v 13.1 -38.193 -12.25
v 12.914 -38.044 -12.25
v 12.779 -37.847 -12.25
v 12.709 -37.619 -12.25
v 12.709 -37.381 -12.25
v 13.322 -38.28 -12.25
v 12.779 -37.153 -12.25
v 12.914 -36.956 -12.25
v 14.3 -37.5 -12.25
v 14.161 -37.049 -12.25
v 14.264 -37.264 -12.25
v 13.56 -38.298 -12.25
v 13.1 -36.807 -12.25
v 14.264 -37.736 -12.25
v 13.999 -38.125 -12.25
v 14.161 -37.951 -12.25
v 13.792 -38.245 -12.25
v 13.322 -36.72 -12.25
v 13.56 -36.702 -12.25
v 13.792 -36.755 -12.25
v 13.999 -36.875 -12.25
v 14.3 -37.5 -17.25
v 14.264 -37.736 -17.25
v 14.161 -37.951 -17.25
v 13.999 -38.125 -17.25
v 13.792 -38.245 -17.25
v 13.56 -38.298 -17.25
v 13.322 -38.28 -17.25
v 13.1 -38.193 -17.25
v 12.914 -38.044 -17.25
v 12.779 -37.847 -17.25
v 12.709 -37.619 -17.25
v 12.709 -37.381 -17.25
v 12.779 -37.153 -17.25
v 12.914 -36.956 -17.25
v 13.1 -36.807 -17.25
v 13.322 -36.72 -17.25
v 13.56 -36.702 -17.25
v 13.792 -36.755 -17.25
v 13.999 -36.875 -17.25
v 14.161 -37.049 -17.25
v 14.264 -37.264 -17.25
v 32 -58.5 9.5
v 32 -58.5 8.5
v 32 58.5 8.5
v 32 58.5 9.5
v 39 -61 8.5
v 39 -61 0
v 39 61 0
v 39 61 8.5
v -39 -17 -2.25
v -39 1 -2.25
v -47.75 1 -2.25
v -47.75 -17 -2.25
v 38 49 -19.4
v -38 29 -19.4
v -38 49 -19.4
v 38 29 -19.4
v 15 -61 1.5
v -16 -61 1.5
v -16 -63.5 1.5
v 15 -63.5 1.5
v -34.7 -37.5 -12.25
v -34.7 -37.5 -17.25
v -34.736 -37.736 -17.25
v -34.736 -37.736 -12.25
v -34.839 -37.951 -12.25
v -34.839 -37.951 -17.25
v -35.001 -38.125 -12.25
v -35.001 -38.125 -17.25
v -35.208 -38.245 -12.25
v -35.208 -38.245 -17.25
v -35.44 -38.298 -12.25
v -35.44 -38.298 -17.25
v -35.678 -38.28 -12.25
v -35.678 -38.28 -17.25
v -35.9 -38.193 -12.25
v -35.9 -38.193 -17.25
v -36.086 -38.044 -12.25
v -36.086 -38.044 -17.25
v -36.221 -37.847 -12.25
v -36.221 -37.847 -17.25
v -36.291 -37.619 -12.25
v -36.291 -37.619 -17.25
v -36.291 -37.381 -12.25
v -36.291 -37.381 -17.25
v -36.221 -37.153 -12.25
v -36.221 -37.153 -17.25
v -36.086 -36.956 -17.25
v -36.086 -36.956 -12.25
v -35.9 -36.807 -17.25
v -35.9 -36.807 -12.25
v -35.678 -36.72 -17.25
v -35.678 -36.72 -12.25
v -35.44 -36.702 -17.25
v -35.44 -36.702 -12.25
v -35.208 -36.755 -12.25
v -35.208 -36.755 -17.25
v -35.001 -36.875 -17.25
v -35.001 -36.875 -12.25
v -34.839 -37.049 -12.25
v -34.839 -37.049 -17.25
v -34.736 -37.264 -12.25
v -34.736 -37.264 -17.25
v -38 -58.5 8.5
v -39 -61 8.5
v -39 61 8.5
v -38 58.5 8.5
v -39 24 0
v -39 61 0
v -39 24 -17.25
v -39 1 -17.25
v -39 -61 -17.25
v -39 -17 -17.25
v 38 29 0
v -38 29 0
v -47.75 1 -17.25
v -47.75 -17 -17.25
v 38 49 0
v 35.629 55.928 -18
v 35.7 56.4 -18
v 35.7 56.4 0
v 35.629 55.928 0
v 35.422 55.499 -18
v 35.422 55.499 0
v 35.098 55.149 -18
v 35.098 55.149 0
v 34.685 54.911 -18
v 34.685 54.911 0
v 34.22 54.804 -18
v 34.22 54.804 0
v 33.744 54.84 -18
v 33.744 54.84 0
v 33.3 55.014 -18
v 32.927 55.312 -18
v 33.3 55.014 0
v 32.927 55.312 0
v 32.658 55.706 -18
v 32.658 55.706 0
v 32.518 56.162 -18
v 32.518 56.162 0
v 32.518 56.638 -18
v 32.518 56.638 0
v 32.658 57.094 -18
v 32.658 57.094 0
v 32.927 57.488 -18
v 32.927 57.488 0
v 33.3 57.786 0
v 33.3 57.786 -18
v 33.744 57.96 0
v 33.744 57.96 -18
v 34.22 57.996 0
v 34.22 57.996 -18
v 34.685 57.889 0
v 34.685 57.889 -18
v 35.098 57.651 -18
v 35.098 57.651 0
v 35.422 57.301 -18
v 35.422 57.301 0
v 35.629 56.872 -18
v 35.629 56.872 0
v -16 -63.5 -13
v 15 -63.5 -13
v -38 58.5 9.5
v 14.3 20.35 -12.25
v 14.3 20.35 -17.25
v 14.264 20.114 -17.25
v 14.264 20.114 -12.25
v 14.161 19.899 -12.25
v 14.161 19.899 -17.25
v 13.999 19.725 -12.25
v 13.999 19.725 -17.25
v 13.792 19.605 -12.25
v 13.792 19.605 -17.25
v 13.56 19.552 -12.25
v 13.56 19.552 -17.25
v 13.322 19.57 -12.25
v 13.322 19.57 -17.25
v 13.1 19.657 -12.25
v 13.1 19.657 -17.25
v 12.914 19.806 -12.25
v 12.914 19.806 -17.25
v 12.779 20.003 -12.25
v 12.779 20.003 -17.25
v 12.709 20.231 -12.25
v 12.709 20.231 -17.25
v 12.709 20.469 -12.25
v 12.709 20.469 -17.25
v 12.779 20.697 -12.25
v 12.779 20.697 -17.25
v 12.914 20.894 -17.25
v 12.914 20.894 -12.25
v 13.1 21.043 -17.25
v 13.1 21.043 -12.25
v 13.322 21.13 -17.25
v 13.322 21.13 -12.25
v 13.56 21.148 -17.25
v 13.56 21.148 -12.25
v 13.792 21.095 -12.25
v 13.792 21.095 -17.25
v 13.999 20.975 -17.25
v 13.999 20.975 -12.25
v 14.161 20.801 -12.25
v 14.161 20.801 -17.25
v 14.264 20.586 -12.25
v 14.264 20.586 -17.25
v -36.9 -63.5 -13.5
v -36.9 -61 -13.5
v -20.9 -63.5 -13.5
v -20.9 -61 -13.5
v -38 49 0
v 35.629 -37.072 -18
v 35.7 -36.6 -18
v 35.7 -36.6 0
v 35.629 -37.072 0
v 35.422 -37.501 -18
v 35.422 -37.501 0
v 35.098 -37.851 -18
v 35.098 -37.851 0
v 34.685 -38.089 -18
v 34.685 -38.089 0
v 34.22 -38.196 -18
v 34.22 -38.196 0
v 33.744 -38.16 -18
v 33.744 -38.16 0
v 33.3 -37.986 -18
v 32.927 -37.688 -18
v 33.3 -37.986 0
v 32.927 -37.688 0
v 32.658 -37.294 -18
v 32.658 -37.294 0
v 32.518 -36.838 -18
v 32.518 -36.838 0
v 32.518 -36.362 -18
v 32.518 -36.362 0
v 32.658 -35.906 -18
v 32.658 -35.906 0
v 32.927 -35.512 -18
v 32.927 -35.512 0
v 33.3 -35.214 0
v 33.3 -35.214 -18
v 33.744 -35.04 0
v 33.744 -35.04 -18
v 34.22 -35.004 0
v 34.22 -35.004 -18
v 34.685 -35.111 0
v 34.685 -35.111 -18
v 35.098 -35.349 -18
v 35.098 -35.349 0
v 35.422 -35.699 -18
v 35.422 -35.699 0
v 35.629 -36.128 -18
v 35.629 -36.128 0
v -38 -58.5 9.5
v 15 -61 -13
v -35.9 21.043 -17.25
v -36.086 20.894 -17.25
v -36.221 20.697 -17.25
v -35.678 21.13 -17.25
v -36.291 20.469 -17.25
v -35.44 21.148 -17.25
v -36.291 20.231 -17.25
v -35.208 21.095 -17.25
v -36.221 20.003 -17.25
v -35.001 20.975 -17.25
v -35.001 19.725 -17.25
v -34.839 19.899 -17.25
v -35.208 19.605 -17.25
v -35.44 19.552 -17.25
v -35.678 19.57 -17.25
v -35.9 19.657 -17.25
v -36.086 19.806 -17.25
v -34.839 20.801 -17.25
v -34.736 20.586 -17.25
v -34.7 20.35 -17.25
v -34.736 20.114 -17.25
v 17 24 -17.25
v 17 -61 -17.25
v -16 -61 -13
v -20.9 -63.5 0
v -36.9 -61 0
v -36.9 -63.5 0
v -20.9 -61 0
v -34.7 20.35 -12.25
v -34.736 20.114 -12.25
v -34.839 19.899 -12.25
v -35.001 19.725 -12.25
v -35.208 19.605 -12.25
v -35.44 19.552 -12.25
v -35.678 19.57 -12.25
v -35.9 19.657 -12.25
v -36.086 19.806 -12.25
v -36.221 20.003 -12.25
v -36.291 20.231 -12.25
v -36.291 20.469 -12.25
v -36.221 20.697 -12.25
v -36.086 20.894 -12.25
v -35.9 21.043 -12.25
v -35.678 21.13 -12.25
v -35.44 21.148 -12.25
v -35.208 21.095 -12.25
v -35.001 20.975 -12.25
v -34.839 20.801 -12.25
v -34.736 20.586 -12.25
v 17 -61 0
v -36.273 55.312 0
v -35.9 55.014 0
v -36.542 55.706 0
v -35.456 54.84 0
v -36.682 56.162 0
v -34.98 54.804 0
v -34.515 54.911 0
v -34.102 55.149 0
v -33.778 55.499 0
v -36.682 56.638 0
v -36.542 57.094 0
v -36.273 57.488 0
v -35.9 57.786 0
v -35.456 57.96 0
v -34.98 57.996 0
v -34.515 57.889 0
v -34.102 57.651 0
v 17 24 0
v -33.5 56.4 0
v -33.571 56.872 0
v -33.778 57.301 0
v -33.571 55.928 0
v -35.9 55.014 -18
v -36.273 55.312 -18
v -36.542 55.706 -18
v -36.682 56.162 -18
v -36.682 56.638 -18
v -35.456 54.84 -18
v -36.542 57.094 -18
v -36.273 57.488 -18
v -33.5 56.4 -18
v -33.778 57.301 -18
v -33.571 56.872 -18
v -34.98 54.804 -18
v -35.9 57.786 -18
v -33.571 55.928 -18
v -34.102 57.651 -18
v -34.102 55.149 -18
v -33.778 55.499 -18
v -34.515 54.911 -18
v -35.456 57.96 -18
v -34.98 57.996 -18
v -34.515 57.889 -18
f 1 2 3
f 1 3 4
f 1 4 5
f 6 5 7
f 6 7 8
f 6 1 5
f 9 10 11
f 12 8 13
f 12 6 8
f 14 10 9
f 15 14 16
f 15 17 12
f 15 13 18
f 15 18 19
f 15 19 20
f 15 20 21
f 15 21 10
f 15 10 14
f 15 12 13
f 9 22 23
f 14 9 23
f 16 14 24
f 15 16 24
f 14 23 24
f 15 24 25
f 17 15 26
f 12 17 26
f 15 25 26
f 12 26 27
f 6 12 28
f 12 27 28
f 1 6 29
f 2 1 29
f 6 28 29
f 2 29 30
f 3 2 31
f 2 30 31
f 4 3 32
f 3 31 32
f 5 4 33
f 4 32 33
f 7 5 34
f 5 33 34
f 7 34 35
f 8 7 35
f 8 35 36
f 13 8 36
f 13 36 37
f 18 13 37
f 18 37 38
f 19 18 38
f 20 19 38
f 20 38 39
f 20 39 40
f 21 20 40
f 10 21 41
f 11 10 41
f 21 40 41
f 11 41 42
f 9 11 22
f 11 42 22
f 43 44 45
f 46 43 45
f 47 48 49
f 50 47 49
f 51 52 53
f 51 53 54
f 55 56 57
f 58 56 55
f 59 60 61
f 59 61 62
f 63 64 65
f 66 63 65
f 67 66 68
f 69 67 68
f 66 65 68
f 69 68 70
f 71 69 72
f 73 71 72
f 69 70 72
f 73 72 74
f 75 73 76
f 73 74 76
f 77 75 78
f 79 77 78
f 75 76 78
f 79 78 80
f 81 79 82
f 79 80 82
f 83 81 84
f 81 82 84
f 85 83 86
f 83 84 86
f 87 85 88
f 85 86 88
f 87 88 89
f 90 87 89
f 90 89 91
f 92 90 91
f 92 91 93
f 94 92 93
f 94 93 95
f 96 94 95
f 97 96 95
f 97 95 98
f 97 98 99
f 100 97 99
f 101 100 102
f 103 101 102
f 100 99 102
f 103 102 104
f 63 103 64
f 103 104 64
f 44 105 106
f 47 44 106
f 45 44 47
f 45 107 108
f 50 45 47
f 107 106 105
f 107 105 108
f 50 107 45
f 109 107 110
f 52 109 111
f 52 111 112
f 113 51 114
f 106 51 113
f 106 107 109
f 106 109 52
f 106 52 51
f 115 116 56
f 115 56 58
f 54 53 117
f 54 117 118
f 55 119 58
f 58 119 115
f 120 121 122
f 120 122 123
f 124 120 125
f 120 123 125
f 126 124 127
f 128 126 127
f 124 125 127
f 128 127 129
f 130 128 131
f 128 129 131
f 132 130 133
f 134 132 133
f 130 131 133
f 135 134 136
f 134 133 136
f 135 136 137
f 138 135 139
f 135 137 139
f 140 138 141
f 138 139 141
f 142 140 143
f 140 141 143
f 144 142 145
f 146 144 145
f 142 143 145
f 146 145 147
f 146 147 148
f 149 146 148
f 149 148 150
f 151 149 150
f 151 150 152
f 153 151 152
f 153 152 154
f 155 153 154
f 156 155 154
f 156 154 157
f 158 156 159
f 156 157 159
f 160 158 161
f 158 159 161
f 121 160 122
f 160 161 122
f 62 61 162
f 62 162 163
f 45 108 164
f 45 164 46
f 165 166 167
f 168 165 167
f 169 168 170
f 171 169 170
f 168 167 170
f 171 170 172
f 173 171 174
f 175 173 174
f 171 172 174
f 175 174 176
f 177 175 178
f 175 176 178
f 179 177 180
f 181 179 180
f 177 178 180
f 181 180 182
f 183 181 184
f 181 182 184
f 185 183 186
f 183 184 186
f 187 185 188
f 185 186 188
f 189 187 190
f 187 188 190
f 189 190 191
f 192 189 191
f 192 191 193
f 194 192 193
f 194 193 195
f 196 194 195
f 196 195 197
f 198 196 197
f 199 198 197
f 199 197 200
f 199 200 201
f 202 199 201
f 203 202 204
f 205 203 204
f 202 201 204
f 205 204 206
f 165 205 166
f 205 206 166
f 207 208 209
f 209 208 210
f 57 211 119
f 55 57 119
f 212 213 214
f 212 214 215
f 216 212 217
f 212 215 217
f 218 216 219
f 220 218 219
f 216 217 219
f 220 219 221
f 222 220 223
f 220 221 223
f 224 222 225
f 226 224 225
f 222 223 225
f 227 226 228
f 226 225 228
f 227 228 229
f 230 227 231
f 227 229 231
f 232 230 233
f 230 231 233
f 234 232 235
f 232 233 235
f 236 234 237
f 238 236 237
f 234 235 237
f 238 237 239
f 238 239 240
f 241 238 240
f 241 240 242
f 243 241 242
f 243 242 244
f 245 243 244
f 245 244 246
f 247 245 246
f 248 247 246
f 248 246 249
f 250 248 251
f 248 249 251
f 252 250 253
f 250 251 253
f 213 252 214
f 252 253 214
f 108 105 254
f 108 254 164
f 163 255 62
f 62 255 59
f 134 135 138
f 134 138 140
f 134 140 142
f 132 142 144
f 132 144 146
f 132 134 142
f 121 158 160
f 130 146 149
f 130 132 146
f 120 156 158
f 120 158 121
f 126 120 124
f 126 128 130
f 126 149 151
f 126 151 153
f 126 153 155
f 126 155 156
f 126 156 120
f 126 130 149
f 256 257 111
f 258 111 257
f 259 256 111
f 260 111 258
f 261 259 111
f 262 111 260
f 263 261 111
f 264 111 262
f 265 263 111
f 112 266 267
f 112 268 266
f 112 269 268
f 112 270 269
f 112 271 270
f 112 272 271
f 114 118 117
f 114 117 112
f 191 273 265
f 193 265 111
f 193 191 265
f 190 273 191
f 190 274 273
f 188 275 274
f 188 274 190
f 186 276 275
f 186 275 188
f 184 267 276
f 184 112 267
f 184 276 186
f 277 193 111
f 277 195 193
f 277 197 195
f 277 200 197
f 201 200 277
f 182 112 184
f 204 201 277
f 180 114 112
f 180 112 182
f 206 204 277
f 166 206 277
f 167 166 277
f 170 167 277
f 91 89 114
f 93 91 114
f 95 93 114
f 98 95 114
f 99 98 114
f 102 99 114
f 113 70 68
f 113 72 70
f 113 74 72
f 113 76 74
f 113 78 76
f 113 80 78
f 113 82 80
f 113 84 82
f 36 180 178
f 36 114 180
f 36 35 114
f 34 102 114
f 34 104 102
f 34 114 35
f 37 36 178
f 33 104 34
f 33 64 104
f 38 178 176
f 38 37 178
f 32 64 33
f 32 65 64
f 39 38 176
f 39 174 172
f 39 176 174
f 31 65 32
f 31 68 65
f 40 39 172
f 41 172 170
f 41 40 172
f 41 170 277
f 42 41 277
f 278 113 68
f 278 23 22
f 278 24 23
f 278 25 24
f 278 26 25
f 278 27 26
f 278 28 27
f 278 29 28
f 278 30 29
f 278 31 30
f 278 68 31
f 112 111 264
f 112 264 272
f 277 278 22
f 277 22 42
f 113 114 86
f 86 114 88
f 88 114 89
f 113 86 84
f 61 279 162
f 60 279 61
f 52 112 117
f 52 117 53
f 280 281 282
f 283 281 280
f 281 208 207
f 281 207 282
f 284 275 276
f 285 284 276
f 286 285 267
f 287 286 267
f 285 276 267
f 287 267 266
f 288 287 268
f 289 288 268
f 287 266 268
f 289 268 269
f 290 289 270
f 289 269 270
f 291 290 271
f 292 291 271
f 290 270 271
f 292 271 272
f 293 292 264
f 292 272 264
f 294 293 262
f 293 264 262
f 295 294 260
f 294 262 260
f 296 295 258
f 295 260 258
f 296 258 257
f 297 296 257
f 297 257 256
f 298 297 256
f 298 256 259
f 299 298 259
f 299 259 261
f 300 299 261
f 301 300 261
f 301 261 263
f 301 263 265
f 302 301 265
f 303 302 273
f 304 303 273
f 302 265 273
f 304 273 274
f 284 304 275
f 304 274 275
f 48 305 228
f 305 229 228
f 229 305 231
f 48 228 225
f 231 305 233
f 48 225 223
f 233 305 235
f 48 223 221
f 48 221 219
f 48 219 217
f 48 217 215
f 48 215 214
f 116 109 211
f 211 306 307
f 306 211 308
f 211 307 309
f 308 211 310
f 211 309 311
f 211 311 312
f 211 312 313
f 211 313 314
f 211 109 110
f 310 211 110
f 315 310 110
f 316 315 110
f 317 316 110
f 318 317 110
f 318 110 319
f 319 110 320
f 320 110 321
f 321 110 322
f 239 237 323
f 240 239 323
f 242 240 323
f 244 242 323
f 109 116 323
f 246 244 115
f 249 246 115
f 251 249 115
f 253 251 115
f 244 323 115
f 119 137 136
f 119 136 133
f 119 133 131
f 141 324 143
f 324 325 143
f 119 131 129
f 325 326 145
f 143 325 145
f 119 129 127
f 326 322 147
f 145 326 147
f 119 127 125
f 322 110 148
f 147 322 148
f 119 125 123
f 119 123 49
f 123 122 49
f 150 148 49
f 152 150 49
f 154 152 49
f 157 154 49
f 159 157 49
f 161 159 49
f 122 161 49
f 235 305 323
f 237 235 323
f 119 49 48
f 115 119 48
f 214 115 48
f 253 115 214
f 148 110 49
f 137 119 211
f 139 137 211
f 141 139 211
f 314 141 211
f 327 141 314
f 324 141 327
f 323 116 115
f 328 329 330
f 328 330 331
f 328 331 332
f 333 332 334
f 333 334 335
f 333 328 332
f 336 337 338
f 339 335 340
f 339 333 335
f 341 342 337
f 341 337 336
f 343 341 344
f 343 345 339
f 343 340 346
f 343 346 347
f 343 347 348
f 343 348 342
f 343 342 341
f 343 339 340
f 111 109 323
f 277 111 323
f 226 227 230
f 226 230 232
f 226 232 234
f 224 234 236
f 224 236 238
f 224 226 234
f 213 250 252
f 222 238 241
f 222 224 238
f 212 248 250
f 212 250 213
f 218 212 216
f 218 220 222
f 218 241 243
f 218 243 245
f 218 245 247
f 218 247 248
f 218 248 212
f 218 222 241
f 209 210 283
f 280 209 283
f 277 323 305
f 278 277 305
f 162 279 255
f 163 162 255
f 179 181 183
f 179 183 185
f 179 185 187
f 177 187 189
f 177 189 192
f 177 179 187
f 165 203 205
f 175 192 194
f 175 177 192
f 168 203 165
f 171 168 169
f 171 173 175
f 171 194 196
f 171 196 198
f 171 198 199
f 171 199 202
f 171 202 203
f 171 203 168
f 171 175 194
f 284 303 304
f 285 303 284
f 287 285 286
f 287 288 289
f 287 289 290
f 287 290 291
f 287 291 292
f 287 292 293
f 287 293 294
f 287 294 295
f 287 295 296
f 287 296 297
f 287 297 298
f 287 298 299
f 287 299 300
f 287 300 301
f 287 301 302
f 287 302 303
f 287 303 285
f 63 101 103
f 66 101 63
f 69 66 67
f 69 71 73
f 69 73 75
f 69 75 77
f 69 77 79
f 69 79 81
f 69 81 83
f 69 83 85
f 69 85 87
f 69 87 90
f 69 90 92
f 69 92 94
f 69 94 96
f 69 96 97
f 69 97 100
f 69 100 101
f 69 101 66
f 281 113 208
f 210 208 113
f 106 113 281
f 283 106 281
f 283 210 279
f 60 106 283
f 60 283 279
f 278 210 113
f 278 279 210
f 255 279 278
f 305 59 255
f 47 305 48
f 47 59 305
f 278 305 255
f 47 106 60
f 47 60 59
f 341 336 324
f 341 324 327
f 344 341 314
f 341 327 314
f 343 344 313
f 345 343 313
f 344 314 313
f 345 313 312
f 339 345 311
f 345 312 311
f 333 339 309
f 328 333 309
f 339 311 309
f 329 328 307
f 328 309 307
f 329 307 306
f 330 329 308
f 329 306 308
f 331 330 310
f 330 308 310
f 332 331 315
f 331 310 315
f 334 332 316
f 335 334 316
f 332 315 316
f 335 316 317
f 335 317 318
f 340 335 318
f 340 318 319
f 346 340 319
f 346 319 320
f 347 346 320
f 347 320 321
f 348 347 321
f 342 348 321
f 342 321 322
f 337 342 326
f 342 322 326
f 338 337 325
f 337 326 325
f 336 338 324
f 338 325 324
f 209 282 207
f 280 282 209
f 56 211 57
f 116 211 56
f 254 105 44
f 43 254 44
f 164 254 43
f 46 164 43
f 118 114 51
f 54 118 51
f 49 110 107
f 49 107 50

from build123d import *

# Parameters (mm, degrees)
F0_W      = 78
F0_H      = 122
F1_DEPTH  = 8.5
F2_W      = 70
F2_H      = 117
F3_DEPTH  = 1
F4_W      = 56
F4_H      = 85
F5_DEPTH  = 17.25
F6_W      = 18
F6_H      = 15
F7_DEPTH  = 8.75
F8_W      = 16
F8_H      = 13.5
F8_W_2    = 31
F8_H_2    = 14.5
F9_DEPTH  = 2.5
F10_R     = 0.8
F11_DEPTH = 5
F12_R     = 1.6
F13_DEPTH = 18
F14_W     = 76
F14_H     = 20
F15_DEPTH = 19.4


with BuildPart() as f1:
    # F0 (on Top) → F1 (new body)
    with BuildSketch(Plane.XY):
        Rectangle(F0_W, F0_H)
    extrude(amount=F1_DEPTH)

    # F2 (on face) → F3 (join)
    with BuildSketch(Plane.XY.offset(8.5)):
        with Locations((-3, 0)):
            Rectangle(F2_W, F2_H)
    extrude(amount=F3_DEPTH)

    # F4 (on face) → F5 (join)
    with BuildSketch(Plane(origin=(0, 0, 0), x_dir=(1, 0, 0), z_dir=(0, 0, -1))):
        with Locations((-11, 18.5)):
            Rectangle(F4_W, F4_H)
    extrude(amount=F5_DEPTH)

    # F6 (on face) → F7 (join)
    with BuildSketch(Plane(origin=(-39, 0, 0), x_dir=(0, -1, 0), z_dir=(-1, 0, 0))):
        with Locations((8, -9.75)):
            Rectangle(F6_W, F6_H)
    extrude(amount=F7_DEPTH)

    # F8 (on face) → F9 (join)
    with BuildSketch(Plane.XZ.offset(61)):
        with Locations((-28.9, -6.75)):
            Rectangle(F8_W, F8_H)
        with Locations((-0.5, -5.75)):
            Rectangle(F8_W_2, F8_H_2)
    extrude(amount=F9_DEPTH)

    # F10 (on face) → F11 (cut)
    with BuildSketch(Plane(origin=(0, 0, -17.25), x_dir=(1, 0, 0), z_dir=(0, 0, -1))):
        with Locations((13.5, 37.5)):
            Circle(F10_R)
        with Locations((-35.5, 37.5)):
            Circle(F10_R)
        with Locations((-35.5, -20.35)):
            Circle(F10_R)
        with Locations((13.5, -20.35)):
            Circle(F10_R)
    extrude(amount=-F11_DEPTH, mode=Mode.SUBTRACT)

    # F12 (on face) → F13 (join)
    with BuildSketch(Plane(origin=(0, 0, 0), x_dir=(1, 0, 0), z_dir=(0, 0, -1))):
        with Locations((-35.1, -56.4)):
            Circle(F12_R)
        with Locations((34.1, -56.4)):
            Circle(F12_R)
        with Locations((34.1, 36.6)):
            Circle(F12_R)
    extrude(amount=F13_DEPTH)

    # F14 (on face) → F15 (join)
    with BuildSketch(Plane(origin=(0, 0, 0), x_dir=(1, 0, 0), z_dir=(0, 0, -1))):
        with Locations((0, -39)):
            Rectangle(F14_W, F14_H)
    extrude(amount=F15_DEPTH)


solid = f1.part
